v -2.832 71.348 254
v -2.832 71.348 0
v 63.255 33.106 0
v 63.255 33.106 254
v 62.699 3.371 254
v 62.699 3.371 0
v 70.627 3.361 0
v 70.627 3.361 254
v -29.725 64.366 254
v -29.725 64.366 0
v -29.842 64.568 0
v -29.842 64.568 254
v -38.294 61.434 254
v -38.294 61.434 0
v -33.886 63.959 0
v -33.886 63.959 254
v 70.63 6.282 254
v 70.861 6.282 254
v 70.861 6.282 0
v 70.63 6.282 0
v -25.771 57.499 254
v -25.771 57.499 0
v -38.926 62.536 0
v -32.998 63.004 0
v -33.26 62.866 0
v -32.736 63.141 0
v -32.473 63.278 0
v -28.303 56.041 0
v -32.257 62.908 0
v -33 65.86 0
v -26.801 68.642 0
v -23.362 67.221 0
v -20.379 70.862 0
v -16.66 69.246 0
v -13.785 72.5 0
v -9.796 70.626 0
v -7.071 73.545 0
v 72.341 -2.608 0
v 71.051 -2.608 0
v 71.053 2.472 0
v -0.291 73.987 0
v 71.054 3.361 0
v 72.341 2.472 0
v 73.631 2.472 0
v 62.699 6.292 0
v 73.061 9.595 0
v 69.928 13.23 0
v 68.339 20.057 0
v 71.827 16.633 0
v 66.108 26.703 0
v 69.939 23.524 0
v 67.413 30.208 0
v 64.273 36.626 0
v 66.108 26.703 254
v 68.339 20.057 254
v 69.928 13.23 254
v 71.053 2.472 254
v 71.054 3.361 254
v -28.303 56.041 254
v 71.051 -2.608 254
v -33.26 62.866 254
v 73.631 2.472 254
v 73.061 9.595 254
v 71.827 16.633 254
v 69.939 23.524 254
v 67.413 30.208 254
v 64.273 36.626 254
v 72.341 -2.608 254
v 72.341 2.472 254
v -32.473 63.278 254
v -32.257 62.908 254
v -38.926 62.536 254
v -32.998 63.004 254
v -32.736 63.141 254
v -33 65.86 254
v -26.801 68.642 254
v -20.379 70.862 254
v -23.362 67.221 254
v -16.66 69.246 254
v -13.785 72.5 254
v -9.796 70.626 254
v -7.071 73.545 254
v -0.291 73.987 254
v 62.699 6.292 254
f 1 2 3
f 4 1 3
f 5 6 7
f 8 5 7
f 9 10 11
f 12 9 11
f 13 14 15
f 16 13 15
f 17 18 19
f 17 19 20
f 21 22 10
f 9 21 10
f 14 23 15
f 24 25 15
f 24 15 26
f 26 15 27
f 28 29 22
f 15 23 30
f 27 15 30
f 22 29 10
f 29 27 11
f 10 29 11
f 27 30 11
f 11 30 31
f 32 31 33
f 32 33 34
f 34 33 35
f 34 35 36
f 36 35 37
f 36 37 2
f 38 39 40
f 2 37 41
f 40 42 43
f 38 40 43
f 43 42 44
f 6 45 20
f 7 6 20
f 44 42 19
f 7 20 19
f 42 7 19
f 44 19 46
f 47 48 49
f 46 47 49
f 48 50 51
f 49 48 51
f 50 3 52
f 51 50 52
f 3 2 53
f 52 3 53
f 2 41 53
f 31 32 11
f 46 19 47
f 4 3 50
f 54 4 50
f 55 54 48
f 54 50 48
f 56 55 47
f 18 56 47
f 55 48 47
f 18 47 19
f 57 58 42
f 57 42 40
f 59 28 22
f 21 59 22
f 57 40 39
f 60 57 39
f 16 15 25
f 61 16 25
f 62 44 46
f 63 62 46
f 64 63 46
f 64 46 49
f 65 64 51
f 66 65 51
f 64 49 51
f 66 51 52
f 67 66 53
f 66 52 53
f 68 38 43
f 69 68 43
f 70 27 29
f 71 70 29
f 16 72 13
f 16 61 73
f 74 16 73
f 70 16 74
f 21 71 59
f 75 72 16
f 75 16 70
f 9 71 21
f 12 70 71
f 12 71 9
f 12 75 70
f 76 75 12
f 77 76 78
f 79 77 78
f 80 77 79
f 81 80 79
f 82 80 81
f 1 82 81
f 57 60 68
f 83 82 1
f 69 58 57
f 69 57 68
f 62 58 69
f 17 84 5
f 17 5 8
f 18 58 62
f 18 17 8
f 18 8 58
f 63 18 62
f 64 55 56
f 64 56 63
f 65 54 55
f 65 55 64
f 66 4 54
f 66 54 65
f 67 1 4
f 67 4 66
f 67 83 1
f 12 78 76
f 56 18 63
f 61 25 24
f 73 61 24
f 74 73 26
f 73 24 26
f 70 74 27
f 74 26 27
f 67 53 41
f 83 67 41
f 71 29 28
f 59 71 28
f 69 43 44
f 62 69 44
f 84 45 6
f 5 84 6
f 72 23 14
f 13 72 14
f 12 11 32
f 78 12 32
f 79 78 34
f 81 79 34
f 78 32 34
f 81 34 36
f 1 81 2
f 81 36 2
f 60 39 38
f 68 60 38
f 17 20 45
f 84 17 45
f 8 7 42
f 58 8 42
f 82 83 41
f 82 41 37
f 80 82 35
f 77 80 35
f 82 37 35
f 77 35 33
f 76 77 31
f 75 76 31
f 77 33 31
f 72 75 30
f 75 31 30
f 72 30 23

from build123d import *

# Parameters (mm, degrees)
F1_DEPTH = 254


with BuildPart() as f1:
    # F0 (on Top) → F1 (new body)
    with BuildSketch(Plane.XY):
        with BuildLine():
            ThreePointArc((-29.842062, 64.568127), (-16.660152, 69.246382), (-2.831554, 71.348459))
            Line((-2.831554, 71.348459), (63.255093, 33.106133))
            ThreePointArc((63.255093, 33.106133), (68.338603, 20.057423), (70.860705, 6.282449))
            Line((70.860705, 6.282449), (70.630319, 6.282449))
            Line((70.630319, 6.282449), (62.698711, 6.291514))
            Line((62.698711, 6.291514), (62.698711, 3.370512))
            Line((62.698711, 3.370512), (70.62698, 3.361451))
            Line((70.62698, 3.361451), (71.05381, 3.361451))
            Line((71.05381, 3.361451), (71.05343, 2.472453))
            Line((71.05343, 2.472453), (71.051259, -2.607547))
            Line((71.051259, -2.607547), (72.340575, -2.607547))
            Line((72.340575, -2.607547), (72.340575, 2.472453))
            Line((72.340575, 2.472453), (73.630904, 2.472453))
            ThreePointArc((73.630904, 2.472453), (70.963492, 20.100215), (64.273057, 36.625686))
            Line((64.273057, 36.625686), (-0.291446, 73.98688))
            ThreePointArc((-0.291446, 73.98688), (-20.379161, 70.861714), (-38.925678, 62.53647))
            Line((-38.925678, 62.53647), (-38.293981, 61.433763))
            Line((-38.293981, 61.433763), (-33.886026, 63.958903))
            Line((-33.886026, 63.958903), (-33.259961, 62.866025))
            ThreePointArc((-33.259961, 62.866025), (-32.867158, 63.073001), (-32.473114, 63.277605))
            Line((-32.473114, 63.277605), (-32.256725, 62.907915))
            Line((-32.256725, 62.907915), (-28.302588, 56.041036))
            Line((-28.302588, 56.041036), (-25.77126, 57.498644))
            Line((-25.77126, 57.498644), (-29.725397, 64.365523))
            Line((-29.725397, 64.365523), (-29.842062, 64.568127))
        make_face()
    extrude(amount=F1_DEPTH)


solid = f1.part
